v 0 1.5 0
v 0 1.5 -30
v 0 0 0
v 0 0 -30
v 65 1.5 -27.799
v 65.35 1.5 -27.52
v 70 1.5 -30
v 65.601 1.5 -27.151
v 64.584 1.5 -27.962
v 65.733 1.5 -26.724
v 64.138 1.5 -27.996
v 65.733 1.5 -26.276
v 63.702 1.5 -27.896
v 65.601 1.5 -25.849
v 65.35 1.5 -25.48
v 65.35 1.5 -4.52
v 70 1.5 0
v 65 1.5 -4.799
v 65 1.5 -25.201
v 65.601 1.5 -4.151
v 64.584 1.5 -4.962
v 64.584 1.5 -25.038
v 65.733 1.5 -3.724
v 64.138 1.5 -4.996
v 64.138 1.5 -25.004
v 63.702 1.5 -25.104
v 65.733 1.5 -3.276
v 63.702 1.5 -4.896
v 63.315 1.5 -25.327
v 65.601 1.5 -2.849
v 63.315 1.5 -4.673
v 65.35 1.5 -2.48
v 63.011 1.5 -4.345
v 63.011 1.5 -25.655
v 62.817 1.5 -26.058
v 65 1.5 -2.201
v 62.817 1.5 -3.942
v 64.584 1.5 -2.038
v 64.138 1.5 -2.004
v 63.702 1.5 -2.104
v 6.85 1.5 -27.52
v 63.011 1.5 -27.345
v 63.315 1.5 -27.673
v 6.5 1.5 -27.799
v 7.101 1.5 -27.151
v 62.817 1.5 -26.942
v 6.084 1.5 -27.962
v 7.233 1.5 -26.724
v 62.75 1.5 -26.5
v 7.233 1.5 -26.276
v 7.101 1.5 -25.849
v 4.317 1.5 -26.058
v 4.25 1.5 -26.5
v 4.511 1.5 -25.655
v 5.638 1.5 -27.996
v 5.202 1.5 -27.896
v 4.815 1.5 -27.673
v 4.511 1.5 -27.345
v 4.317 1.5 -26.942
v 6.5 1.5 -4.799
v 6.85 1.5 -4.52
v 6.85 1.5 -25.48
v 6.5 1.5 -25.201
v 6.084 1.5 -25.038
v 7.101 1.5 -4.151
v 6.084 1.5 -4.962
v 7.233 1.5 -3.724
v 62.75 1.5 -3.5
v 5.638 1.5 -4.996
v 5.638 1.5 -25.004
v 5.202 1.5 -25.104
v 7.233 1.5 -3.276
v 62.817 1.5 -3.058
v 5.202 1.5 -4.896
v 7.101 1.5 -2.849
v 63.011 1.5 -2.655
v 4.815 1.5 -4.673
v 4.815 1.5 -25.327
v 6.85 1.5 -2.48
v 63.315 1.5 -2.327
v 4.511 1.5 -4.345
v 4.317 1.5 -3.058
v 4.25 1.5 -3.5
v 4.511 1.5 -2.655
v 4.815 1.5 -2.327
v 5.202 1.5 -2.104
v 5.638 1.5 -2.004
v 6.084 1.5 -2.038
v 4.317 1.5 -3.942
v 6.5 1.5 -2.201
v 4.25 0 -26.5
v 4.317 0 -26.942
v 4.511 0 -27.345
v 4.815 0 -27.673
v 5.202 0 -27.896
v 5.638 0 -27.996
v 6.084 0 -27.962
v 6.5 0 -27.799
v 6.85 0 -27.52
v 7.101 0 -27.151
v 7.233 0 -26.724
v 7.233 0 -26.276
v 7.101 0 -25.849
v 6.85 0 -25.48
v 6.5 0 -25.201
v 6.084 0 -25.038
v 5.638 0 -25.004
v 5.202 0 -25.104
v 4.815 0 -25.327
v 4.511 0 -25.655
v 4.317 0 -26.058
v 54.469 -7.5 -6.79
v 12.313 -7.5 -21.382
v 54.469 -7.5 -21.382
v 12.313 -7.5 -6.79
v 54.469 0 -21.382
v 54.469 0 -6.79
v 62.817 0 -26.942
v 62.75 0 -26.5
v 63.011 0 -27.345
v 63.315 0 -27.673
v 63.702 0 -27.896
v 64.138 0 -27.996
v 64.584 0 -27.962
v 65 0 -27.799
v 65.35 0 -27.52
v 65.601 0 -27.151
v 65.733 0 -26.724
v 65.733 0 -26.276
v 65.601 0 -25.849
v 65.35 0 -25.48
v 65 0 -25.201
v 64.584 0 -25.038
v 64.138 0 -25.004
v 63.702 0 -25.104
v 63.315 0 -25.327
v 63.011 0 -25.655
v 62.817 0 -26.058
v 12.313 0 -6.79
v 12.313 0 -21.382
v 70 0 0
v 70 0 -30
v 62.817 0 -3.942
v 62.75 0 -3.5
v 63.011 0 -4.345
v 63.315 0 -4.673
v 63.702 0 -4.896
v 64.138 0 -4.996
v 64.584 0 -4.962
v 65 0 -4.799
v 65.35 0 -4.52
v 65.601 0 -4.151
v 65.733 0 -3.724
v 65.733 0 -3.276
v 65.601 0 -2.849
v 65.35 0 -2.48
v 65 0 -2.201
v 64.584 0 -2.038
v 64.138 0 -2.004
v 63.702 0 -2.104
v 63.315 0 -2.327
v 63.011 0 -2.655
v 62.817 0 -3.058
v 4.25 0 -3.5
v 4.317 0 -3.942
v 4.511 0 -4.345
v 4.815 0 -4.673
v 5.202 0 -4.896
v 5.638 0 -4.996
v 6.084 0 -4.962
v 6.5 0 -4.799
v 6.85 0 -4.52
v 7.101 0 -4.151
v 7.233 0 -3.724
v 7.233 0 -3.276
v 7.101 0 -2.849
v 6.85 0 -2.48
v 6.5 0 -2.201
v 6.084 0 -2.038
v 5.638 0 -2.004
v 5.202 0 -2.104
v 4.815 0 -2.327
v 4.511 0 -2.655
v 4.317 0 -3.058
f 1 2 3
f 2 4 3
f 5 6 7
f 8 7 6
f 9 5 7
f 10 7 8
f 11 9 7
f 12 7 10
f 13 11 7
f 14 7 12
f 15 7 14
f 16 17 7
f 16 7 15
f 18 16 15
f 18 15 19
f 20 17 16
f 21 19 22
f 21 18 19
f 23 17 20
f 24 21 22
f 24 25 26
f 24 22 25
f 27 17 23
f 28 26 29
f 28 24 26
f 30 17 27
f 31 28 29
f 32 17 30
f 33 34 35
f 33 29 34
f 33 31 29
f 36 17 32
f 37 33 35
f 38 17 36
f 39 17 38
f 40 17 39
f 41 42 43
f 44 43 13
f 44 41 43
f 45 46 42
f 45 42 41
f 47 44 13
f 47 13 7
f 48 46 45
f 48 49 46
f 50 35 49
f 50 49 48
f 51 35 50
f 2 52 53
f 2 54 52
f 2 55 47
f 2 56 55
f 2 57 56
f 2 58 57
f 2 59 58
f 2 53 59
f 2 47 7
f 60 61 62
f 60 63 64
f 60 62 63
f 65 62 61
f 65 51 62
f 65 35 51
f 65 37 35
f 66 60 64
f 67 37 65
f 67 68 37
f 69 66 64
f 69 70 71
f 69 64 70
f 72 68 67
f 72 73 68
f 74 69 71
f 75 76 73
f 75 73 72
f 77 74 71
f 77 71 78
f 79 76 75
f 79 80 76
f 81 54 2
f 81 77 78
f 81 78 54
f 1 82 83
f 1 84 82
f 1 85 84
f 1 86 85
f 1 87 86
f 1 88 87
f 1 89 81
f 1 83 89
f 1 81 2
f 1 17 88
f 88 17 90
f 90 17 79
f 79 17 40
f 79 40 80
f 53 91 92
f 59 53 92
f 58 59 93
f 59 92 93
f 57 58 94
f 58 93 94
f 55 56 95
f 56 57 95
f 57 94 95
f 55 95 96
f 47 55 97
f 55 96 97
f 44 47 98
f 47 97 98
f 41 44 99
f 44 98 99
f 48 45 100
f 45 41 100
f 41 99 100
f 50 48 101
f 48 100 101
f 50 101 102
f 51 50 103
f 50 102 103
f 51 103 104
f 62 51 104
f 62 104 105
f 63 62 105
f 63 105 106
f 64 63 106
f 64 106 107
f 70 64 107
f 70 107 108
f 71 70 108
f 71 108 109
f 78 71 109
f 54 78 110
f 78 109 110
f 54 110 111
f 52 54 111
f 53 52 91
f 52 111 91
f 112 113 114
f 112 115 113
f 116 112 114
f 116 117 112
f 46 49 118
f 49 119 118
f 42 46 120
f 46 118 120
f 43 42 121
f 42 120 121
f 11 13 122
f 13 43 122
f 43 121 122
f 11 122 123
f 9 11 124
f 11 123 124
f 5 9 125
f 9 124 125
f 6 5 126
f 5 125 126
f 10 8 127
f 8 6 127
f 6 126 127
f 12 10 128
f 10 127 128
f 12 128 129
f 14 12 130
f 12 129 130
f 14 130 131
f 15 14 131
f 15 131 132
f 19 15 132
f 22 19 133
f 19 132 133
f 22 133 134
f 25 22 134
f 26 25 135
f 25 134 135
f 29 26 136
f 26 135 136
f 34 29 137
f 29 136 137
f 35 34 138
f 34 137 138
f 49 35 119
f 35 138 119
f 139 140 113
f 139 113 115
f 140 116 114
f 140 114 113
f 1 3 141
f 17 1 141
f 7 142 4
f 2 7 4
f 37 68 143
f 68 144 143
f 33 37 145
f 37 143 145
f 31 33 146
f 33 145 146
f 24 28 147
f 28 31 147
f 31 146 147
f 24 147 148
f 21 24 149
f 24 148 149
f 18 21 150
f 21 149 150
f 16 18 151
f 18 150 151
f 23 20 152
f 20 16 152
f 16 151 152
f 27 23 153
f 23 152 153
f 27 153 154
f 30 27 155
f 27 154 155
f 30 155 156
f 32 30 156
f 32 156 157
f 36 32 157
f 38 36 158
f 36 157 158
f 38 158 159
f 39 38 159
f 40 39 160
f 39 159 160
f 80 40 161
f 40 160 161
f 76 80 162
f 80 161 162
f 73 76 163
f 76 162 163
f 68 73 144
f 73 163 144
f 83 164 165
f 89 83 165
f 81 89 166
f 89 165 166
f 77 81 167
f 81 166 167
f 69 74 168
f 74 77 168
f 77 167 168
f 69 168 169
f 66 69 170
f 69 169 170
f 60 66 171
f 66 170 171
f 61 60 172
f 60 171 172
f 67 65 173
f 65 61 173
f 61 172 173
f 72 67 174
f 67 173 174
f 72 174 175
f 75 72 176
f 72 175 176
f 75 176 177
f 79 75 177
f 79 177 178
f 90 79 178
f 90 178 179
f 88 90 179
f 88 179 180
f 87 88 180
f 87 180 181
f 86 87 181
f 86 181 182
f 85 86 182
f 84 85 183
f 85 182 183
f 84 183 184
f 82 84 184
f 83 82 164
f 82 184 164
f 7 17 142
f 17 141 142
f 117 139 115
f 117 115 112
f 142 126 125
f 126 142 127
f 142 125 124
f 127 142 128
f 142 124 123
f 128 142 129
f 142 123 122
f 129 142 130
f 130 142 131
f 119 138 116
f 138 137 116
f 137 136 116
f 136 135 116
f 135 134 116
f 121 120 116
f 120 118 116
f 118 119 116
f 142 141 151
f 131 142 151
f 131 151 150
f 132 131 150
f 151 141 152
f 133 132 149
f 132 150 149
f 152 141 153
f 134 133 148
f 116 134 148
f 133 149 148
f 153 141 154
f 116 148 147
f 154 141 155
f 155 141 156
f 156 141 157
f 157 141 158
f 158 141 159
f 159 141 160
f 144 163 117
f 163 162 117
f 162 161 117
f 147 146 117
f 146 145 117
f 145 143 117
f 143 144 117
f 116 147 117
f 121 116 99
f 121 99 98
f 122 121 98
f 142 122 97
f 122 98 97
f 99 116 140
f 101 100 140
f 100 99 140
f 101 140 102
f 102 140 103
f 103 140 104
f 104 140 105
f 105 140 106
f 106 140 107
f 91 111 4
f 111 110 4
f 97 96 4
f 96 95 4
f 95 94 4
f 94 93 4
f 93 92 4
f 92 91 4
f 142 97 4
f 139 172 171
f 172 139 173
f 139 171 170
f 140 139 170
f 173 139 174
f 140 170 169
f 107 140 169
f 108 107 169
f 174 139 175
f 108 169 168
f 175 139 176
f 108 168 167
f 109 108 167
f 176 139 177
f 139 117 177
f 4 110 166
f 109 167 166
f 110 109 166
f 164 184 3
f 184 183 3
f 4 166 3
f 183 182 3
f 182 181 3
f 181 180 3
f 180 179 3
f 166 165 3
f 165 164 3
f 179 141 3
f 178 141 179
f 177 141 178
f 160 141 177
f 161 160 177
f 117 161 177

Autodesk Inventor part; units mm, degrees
ref_plane "YZ Plane" through (0, 0, 0) normal (1, 0, 0) x (0, 1, 0)
ref_plane "XZ Plane" through (0, 0, 0) normal (0, 1, 0) x (-1, 0, 0)
ref_plane "XY Plane" through (0, 0, 0) normal (0, 0, 1) x (1, 0, 0)
sketch "Sketch1" plane through (0, 0, 0) normal (0, 1, 0) x (-1, 0, 0)
  line L0 (0, 0) -> (-70, 0)
  line L1 (-70, 0) -> (-70, -30)
  line L2 (-70, -30) -> (0, -30)
  line L3 (0, -30) -> (0, 0)
  circle A0 centre (-5.75, -3.5) radius 1.5
  circle A1 centre (-5.75, -26.5) radius 1.5
  circle A2 centre (-64.25, -3.5) radius 1.5
  circle A3 centre (-64.25, -26.5) radius 1.5
  line L4 (-5.75, -3.5) -> (-5.75, -26.5) construction
  line L5 (-5.75, -26.5) -> (-64.25, -26.5) construction
  line L6 (-64.25, -26.5) -> (-64.25, -3.5) construction
  line L7 (-64.25, -3.5) -> (-5.75, -3.5) construction
  dimension "d0" = 70
  dimension "d1" = 30
  dimension "d2" = 3
  dimension "d3" = 3
  dimension "d4" = 3
  dimension "d5" = 3
  dimension "d6" = 55.5
  dimension "d8" = 20
  dimension "d10" = 4.25
  dimension "d11" = 4.25
  dimension "d12" = 3.5
  dimension "d13" = 3.5
extrude "Extrusion1" add sketch "Sketch1" along normal blind 1.5
sketch "Sketch2" plane through (0, 0, 0) normal (0, -1, 0) x (1, 0, 0)
  line L0 (12.3126, -6.7897) -> (54.4692, -6.7897)
  line L1 (54.4692, -6.7897) -> (54.4692, -21.3823)
  line L2 (54.4692, -21.3823) -> (12.3126, -21.3823)
  line L3 (12.3126, -21.3823) -> (12.3126, -6.7897)
  point P0 (0, 0)
extrude "Extrusion2" add sketch "Sketch2" along normal blind 7.5
equation "\"d10\" = d11"
equation "\"d12\" = d13"
properties part number "my_own_pcb"
